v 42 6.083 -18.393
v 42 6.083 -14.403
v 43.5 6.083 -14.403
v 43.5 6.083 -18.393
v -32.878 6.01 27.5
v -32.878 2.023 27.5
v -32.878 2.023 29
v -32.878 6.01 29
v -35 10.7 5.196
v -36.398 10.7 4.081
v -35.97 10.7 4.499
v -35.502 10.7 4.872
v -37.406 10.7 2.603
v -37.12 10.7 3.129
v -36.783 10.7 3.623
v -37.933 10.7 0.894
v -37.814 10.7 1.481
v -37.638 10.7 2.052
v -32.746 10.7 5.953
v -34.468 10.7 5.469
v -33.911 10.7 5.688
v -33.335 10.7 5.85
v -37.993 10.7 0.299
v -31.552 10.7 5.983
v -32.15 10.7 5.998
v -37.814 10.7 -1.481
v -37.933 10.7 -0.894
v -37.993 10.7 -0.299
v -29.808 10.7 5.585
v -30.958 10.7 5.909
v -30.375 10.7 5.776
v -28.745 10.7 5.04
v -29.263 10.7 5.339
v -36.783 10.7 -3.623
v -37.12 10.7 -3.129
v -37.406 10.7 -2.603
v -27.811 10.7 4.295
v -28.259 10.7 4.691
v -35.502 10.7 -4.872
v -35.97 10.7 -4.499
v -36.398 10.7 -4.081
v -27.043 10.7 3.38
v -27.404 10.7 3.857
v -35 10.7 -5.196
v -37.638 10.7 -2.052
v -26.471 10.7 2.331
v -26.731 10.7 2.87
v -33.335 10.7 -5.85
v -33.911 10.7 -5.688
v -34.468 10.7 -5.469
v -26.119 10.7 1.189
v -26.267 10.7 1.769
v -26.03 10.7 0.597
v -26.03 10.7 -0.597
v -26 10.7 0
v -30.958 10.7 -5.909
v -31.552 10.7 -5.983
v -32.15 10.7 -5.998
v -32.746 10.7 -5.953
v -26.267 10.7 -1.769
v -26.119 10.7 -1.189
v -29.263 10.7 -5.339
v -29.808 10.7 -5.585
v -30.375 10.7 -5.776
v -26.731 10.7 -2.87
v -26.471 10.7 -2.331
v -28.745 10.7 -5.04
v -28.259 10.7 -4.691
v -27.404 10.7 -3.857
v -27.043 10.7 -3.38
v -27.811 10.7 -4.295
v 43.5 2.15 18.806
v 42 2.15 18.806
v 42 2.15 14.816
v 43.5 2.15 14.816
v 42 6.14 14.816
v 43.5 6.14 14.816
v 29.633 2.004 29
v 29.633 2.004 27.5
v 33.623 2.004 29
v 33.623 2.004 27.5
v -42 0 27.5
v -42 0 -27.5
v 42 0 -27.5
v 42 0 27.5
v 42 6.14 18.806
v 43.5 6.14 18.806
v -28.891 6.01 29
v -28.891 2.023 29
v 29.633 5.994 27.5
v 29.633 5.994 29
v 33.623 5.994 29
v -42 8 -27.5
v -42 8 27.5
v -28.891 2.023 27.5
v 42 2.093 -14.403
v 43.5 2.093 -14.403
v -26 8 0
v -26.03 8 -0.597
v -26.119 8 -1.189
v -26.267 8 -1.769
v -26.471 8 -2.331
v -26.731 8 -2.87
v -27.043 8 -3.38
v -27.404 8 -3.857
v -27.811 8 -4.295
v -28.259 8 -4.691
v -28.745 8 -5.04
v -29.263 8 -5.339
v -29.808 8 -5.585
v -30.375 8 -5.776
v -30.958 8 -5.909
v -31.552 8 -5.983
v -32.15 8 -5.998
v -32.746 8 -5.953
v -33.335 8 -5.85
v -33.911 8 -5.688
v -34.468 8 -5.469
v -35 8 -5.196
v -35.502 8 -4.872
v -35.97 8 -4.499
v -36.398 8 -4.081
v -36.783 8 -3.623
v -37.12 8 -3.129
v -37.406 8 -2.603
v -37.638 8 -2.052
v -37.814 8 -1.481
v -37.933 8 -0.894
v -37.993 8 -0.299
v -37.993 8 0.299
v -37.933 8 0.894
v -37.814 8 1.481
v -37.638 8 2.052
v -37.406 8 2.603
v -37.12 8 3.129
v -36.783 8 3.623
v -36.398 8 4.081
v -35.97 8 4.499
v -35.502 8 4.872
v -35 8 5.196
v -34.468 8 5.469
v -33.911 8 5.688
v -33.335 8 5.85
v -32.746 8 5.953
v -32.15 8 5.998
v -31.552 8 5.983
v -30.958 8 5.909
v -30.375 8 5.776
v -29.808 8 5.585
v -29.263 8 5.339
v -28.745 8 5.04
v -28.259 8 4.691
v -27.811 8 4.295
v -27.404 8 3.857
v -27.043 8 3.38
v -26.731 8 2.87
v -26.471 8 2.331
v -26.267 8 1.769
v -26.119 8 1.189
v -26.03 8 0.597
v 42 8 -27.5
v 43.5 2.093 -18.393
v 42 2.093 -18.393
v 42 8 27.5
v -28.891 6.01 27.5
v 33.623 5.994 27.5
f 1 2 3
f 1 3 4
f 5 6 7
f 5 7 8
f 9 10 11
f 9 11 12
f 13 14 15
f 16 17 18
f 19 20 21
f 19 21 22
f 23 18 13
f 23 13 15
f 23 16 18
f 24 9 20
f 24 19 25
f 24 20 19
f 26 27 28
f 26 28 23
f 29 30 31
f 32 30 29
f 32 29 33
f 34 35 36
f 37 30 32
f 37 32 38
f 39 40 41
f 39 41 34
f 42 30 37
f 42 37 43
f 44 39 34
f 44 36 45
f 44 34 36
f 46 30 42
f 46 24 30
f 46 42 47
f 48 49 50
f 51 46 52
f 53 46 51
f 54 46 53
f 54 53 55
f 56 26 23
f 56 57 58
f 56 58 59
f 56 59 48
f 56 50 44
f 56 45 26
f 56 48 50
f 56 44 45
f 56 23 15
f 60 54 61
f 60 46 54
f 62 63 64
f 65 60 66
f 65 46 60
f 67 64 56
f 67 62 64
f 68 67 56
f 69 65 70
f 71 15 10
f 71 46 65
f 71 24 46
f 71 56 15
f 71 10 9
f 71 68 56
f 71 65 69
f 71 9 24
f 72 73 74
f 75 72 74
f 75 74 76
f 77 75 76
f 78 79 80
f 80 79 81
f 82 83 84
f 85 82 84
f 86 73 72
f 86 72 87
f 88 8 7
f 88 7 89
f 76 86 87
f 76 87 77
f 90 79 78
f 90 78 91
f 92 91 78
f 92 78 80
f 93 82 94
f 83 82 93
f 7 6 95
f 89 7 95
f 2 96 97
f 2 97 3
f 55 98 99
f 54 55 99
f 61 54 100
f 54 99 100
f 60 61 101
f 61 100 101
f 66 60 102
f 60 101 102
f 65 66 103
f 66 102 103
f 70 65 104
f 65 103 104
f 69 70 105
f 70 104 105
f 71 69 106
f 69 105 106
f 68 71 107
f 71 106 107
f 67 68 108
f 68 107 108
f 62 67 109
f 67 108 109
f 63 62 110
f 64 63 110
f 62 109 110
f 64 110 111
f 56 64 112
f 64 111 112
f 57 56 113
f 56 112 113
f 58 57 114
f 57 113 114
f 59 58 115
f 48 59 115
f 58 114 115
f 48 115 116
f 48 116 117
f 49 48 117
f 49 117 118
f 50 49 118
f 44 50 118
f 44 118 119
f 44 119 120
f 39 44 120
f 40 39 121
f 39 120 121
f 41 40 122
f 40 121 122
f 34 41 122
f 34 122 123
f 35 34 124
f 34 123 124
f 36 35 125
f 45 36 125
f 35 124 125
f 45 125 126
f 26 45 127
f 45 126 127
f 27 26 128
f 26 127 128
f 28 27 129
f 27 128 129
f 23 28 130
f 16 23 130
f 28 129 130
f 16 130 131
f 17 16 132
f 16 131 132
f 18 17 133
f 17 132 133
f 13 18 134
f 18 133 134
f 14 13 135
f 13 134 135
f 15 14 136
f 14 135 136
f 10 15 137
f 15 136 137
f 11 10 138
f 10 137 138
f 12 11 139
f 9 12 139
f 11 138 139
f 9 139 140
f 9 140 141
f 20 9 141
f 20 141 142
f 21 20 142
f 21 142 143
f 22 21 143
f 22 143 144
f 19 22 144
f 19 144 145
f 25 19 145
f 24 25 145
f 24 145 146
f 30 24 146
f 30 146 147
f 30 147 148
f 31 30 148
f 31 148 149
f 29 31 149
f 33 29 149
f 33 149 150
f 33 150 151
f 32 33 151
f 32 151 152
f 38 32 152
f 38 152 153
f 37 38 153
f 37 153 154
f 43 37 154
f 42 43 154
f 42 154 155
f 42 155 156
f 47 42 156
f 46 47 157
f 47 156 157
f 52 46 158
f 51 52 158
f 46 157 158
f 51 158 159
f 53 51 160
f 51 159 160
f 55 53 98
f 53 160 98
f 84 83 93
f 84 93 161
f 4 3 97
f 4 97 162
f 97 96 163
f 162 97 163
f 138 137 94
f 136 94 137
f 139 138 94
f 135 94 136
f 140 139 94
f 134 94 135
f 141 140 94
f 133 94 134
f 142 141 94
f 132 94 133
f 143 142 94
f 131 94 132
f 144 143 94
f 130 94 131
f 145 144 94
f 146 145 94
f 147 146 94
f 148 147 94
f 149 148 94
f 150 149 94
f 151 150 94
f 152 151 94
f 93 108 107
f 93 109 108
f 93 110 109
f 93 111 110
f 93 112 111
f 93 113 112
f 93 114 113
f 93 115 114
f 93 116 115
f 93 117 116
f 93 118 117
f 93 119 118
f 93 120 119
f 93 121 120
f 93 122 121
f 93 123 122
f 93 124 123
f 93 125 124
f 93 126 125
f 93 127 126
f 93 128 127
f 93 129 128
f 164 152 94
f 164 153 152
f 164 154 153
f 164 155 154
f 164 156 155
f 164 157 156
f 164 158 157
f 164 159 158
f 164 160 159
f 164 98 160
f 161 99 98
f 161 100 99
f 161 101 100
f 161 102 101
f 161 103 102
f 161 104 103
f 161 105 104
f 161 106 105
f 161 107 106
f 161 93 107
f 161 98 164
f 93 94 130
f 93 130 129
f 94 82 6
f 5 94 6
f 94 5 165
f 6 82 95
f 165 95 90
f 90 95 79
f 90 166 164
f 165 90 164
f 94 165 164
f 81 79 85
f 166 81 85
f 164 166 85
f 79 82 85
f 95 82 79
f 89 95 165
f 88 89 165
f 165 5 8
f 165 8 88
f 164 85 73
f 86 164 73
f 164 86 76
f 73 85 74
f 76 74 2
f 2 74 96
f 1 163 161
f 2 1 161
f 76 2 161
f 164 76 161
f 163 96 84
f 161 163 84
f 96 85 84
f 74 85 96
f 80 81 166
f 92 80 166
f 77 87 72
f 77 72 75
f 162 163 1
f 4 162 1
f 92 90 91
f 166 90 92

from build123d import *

# Parameters (mm, degrees)
SKETCH1_W           = 84
SKETCH1_H           = 55
BOSS_EXTRUDE1_DEPTH = 8
SKETCH2_W           = 3.987273362
SKETCH2_H           = 3.987273362
BOSS_EXTRUDE2_DEPTH = 1.5
SKETCH3_W           = 3.99
SKETCH3_H           = 3.99
BOSS_EXTRUDE3_DEPTH = 1.5
SKETCH6_W           = 3.99
SKETCH6_H           = 3.99
BOSS_EXTRUDE4_DEPTH = 1.5
SKETCH7_W           = 3.99
SKETCH7_H           = 3.99
BOSS_EXTRUDE5_DEPTH = 1.5
SKETCH10_R          = 6
BOSS_EXTRUDE6_DEPTH = 2.7


with BuildPart() as part:
    # Sketch1 → Boss-Extrude1 (new body)
    with BuildSketch(Plane(origin=(0, 0, 0), x_dir=(1, 0, 0), z_dir=(0, 1, 0))):
        Rectangle(SKETCH1_W, SKETCH1_H)
    extrude(amount=BOSS_EXTRUDE1_DEPTH)

    # Sketch2 → Boss-Extrude2 (add)
    with BuildSketch(Plane(origin=(0, -0.439186924, 27.5), x_dir=(1, 0, 0), z_dir=(0, 0, 1))):
        with Locations((-30.884576243, 4.455349568)):
            Rectangle(SKETCH2_W, SKETCH2_H)
    extrude(amount=BOSS_EXTRUDE2_DEPTH)

    # Sketch3 → Boss-Extrude3 (add)
    with BuildSketch(Plane(origin=(0, -0.590315395, 27.5), x_dir=(1, 0, 0), z_dir=(0, 0, 1))):
        with Locations((31.62769067, 4.58925653)):
            Rectangle(SKETCH3_W, SKETCH3_H)
    extrude(amount=BOSS_EXTRUDE3_DEPTH)

    # Sketch6 → Boss-Extrude4 (add)
    with BuildSketch(Plane(origin=(42, 0.101407509, -1.505913579), x_dir=(0, 0, -1), z_dir=(1, 0, 0))):
        with Locations((-18.317394251, 4.044008008)):
            Rectangle(SKETCH6_W, SKETCH6_H)
    extrude(amount=BOSS_EXTRUDE4_DEPTH)

    # Sketch7 → Boss-Extrude5 (add)
    with BuildSketch(Plane(origin=(42, -0.062003659, -3.114914247), x_dir=(0, 0, -1), z_dir=(1, 0, 0))):
        with Locations((13.283568203, 4.150096741)):
            Rectangle(SKETCH7_W, SKETCH7_H)
    extrude(amount=BOSS_EXTRUDE5_DEPTH)

    # Sketch10 → Boss-Extrude6 (add)
    with BuildSketch(Plane(origin=(0, 8, 0), x_dir=(1, 0, 0), z_dir=(0, 1, 0))):
        with Locations((-32, 0)):
            Circle(SKETCH10_R)
    extrude(amount=BOSS_EXTRUDE6_DEPTH)


solid = part.part
